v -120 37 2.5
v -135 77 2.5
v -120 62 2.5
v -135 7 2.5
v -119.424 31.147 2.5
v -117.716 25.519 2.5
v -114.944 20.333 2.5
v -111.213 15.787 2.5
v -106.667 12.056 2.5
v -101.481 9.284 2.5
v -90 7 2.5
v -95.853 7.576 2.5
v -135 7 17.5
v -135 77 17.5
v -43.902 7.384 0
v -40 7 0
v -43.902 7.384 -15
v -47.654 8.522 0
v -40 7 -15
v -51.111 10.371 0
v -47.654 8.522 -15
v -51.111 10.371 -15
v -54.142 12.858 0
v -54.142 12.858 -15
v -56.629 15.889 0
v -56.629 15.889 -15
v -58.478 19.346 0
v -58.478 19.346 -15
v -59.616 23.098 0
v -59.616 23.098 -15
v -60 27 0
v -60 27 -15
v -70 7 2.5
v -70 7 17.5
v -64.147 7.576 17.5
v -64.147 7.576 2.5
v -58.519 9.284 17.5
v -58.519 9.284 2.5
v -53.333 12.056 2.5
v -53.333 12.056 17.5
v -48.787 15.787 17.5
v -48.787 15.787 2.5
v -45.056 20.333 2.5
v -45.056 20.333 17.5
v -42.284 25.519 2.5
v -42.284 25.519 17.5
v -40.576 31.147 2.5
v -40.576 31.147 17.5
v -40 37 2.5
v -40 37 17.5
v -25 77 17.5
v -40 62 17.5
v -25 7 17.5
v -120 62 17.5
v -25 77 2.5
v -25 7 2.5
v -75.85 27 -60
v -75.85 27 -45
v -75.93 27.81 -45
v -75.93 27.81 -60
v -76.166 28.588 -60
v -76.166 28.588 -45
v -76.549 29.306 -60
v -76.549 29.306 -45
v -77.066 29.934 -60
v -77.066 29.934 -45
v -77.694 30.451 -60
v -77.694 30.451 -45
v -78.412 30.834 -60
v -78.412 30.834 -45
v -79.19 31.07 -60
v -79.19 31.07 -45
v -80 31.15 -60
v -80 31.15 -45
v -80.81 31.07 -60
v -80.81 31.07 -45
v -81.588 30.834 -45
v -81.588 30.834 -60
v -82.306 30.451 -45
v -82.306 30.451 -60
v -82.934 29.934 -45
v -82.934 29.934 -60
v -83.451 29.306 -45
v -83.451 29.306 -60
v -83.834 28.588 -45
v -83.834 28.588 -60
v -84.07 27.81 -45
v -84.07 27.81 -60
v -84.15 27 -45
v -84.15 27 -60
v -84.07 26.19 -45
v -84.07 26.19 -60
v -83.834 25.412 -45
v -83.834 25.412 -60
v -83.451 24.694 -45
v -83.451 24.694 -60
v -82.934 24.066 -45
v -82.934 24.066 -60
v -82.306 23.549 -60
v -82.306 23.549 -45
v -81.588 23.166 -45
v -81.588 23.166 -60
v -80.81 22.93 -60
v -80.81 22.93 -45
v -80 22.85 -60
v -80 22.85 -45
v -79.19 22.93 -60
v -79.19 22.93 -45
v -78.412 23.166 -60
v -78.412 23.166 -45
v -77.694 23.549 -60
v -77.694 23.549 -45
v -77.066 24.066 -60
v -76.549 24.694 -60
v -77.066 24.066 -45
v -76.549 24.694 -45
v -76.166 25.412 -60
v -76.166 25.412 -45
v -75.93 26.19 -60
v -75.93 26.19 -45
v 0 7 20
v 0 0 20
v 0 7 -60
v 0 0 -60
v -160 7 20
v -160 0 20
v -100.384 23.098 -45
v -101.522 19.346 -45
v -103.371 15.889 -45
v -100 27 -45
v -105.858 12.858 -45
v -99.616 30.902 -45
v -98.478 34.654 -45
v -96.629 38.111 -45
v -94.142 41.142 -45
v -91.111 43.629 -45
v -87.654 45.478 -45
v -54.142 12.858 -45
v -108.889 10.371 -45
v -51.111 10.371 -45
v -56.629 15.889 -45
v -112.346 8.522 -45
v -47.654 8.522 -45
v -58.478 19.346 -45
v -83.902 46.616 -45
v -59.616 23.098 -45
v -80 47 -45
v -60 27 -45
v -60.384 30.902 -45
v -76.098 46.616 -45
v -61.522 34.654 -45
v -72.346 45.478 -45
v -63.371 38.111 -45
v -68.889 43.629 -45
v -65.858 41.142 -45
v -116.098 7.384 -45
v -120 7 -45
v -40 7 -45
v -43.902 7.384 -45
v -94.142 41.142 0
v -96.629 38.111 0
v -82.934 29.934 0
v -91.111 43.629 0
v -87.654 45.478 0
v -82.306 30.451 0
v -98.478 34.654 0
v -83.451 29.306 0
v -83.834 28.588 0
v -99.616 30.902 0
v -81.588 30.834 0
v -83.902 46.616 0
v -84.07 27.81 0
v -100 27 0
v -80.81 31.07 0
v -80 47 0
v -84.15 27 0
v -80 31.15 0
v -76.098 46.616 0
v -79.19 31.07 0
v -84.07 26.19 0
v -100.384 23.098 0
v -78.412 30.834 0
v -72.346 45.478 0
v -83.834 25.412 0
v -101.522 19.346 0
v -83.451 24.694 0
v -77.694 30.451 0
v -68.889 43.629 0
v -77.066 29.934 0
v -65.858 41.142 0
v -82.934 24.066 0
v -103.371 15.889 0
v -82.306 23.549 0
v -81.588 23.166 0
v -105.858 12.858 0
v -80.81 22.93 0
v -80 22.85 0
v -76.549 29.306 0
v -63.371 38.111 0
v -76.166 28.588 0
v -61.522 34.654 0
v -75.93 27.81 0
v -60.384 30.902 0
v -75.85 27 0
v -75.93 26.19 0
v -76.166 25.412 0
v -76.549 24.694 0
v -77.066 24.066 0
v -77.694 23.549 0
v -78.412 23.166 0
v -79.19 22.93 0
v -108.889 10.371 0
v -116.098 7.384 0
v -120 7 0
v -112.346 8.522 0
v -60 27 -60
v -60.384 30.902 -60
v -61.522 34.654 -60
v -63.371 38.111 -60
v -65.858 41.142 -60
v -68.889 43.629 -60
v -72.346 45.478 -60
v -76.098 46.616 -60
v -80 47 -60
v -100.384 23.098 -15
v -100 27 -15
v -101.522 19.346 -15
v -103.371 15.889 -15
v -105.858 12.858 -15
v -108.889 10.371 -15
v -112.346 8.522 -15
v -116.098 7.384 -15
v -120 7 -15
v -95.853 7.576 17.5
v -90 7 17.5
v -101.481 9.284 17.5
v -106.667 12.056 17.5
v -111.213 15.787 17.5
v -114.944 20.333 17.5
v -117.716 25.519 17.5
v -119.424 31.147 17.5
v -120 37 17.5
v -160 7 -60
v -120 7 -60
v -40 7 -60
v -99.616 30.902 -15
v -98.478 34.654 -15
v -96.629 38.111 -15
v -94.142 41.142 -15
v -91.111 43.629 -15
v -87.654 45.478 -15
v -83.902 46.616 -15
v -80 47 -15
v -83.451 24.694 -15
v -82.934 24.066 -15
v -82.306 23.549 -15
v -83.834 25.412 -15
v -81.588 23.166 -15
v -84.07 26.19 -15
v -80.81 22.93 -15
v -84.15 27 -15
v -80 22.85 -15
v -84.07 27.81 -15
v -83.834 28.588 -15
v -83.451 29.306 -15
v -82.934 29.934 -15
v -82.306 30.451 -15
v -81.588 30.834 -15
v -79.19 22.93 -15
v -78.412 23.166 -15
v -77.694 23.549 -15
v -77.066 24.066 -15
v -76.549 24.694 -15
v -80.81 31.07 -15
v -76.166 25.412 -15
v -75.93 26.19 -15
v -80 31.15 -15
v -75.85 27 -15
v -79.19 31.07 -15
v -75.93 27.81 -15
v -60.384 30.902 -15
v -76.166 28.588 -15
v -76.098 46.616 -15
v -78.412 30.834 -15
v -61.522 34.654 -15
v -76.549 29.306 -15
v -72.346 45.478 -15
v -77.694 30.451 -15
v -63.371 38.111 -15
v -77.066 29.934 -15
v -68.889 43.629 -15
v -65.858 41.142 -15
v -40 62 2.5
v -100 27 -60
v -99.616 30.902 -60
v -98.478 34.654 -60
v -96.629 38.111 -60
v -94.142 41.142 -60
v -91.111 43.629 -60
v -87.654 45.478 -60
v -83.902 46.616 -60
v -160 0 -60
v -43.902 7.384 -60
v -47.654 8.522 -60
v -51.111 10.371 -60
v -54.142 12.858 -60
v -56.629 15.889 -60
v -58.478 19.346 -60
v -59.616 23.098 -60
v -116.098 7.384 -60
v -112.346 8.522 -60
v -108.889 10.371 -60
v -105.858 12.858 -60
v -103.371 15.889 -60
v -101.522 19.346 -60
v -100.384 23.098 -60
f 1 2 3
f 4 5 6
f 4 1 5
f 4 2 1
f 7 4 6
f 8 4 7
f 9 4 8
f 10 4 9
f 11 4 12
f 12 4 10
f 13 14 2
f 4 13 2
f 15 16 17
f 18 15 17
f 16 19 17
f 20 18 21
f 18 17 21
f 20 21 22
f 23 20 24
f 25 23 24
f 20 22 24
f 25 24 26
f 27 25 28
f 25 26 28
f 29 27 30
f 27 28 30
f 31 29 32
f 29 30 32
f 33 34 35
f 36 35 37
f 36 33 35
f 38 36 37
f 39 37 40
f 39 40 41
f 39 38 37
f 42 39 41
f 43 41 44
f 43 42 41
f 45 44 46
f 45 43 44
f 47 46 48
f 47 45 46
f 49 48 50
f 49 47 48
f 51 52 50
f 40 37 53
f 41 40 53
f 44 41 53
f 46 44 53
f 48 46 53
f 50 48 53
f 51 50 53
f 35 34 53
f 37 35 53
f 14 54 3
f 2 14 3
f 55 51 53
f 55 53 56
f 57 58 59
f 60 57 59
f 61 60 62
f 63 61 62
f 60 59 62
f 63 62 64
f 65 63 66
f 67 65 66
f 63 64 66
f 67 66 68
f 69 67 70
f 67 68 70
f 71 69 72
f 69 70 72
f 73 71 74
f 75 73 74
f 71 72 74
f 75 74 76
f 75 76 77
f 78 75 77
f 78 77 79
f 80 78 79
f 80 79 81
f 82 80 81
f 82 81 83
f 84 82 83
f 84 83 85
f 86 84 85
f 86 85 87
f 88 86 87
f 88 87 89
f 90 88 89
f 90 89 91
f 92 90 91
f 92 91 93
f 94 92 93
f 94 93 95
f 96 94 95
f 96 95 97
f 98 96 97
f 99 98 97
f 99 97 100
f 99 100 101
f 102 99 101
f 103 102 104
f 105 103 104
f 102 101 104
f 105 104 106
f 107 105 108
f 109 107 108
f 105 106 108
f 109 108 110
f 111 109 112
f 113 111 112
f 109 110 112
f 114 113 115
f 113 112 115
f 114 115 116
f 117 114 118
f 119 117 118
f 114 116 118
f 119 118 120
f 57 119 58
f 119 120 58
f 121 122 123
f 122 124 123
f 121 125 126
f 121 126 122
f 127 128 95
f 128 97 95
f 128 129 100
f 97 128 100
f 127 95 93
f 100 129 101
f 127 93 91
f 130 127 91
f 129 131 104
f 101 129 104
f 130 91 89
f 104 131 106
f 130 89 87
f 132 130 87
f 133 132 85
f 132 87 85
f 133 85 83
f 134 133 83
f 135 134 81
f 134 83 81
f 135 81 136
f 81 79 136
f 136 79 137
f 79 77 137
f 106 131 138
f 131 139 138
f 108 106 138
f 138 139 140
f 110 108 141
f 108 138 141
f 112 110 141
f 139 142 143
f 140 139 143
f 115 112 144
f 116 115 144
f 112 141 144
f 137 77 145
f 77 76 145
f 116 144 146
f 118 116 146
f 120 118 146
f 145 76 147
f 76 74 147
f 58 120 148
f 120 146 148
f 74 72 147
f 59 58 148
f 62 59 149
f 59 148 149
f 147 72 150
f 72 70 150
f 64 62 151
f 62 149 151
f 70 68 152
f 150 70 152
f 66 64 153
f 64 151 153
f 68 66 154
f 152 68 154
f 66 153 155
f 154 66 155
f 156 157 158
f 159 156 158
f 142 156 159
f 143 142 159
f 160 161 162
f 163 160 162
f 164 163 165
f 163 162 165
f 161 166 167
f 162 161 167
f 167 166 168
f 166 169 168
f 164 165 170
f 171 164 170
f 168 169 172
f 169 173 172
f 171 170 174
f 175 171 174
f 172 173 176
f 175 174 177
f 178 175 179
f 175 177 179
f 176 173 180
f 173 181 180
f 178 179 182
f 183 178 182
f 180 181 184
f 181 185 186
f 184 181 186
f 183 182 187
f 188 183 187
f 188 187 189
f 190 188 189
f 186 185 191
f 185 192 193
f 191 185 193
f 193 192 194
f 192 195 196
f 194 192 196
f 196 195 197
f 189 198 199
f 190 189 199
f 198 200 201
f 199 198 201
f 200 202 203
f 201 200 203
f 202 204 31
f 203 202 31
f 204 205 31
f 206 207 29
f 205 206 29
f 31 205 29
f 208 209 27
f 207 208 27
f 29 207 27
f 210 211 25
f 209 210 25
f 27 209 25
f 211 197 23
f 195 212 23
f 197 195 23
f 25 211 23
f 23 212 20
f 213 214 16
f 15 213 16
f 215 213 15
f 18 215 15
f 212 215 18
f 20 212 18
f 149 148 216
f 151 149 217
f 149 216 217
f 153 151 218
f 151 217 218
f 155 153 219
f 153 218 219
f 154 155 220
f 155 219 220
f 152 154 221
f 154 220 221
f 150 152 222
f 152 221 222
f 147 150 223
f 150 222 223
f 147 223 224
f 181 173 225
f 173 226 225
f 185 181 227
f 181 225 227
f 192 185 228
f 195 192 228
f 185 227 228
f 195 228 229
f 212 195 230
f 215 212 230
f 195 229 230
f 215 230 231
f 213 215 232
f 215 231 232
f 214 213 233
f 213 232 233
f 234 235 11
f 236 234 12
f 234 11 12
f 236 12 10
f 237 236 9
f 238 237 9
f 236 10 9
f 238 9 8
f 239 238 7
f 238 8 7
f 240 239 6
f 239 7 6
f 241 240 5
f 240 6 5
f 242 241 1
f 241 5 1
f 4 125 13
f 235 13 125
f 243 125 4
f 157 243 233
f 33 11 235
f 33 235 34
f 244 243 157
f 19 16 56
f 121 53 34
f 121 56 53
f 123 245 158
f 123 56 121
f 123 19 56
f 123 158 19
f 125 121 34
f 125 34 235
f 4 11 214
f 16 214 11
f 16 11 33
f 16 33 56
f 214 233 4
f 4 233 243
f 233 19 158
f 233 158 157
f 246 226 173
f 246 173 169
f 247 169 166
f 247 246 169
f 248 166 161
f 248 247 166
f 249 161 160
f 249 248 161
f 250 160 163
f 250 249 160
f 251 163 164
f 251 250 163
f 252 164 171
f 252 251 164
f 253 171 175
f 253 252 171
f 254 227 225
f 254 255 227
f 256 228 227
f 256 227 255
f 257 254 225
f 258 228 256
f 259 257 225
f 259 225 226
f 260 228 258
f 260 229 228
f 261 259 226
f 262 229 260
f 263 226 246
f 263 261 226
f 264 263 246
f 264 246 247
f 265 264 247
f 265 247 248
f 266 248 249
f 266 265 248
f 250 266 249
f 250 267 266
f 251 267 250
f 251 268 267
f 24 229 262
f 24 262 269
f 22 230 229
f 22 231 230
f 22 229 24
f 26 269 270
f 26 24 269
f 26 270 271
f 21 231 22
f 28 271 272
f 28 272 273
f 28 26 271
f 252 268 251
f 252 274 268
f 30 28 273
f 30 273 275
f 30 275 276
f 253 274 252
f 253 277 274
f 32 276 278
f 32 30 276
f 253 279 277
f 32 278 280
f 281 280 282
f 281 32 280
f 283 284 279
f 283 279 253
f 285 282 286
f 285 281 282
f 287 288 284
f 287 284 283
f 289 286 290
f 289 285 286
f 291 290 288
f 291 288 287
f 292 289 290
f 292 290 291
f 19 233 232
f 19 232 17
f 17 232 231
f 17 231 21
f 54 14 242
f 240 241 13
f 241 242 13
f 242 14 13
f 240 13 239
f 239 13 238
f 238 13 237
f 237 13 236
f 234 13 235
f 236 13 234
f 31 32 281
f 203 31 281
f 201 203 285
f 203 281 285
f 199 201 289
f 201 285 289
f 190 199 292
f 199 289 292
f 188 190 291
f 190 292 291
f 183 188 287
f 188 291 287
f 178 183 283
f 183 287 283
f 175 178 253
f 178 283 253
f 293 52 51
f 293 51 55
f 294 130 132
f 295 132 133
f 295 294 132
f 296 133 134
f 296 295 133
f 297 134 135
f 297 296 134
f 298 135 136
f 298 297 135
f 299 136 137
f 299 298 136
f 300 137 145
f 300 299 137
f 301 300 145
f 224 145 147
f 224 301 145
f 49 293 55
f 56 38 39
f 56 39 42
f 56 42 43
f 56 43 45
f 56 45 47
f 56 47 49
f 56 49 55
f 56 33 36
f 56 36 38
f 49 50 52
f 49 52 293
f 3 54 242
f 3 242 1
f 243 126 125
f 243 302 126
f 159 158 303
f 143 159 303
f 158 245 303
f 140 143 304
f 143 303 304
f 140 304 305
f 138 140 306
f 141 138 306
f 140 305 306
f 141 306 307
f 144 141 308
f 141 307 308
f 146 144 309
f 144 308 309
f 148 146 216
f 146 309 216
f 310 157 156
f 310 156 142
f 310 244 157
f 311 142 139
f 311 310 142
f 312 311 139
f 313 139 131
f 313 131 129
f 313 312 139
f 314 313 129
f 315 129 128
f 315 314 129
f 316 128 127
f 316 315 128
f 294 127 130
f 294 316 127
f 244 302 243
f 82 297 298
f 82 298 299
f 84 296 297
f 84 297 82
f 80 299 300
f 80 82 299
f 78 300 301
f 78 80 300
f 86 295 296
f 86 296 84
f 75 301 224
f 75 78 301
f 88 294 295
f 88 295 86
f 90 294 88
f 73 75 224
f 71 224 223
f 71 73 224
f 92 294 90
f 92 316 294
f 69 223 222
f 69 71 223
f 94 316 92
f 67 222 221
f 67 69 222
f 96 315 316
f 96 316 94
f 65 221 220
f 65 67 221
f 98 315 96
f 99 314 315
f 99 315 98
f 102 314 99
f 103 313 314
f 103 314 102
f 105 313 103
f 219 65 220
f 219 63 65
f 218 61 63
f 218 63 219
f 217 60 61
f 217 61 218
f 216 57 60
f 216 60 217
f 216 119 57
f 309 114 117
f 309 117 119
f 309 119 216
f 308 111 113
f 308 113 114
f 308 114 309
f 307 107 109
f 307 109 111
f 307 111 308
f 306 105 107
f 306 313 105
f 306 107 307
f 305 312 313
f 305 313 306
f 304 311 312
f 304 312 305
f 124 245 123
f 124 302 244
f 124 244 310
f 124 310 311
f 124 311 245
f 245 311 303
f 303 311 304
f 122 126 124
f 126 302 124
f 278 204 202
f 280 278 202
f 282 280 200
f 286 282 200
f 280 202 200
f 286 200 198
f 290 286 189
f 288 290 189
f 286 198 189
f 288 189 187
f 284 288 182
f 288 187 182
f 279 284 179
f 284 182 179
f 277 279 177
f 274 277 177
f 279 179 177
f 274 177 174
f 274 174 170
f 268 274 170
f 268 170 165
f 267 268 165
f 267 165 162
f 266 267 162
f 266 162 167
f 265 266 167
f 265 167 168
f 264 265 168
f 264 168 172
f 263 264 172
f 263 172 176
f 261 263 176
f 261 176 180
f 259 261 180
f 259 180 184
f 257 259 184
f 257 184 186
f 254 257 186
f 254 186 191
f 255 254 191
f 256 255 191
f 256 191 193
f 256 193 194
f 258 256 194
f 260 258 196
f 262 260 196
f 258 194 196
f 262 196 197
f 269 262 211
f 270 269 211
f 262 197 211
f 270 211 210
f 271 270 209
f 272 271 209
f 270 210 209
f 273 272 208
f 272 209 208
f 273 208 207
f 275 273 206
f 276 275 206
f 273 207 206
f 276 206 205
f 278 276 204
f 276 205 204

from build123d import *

# Parameters (mm, degrees)
SKETCH1_W           = 160
SKETCH1_H           = 60
BOSS_EXTRUDE1_DEPTH = 7
SKETCH2_W           = 40
SKETCH2_H           = 60
BOSS_EXTRUDE2_DEPTH = 40
FILLET1_R           = 20
SKETCH3_W           = 30
SKETCH3_H           = 40
CUT_EXTRUDE1_DEPTH  = 40
SKETCH4_R           = 4.15
CUT_EXTRUDE2_DEPTH  = 178.225844616
FILLET2_R           = 20
SKETCH5_W           = 160
SKETCH5_H           = 7
BOSS_EXTRUDE3_DEPTH = 20
SKETCH6_W           = 15
SKETCH6_H           = 15
BOSS_EXTRUDE4_DEPTH = 70
FILLET3_R           = 30
CHAMFER1_SIZE       = 15


with BuildPart() as part:
    # Sketch1 → Boss-Extrude1 (new body)
    with BuildSketch(Plane(origin=(0, 0, 0), x_dir=(1, 0, 0), z_dir=(0, 1, 0))):
        with Locations((-80, 30)):
            Rectangle(SKETCH1_W, SKETCH1_H)
    extrude(amount=BOSS_EXTRUDE1_DEPTH)

    # Sketch2 → Boss-Extrude2 (add)
    with BuildSketch(Plane(origin=(0, 7, 0), x_dir=(1, 0, 0), z_dir=(0, 1, 0))):
        with Locations((-80, 30)):
            Rectangle(SKETCH2_W, SKETCH2_H)
    extrude(amount=BOSS_EXTRUDE2_DEPTH)

    # Fillet1
    fillet1_edges = [part.edges().sort_by_distance(p)[0] for p in [
        (-60, 47, -30),
        (-100, 47, -30),
    ]]
    fillet(fillet1_edges, radius=FILLET1_R - 0.0001)  # a hair under: the kernel refuses the full size

    # Sketch3 → Cut-Extrude1 (cut)
    with BuildSketch(Plane(origin=(-60, 0, 0), x_dir=(0, 0, -1), z_dir=(1, 0, 0))):
        with Locations((30, 27)):
            Rectangle(SKETCH3_W, SKETCH3_H)
    extrude(amount=-CUT_EXTRUDE1_DEPTH, mode=Mode.SUBTRACT)

    # Sketch4 → Cut-Extrude2 (cut, through all)
    with BuildSketch(Plane.XY):
        with Locations((-80, 27)):
            Circle(SKETCH4_R)
    extrude(amount=-CUT_EXTRUDE2_DEPTH, mode=Mode.SUBTRACT)

    # Fillet2
    fillet2_edges = [part.edges().sort_by_distance(p)[0] for p in [
        (-100, 7, -7.5),
        (-100, 7, -52.5),
        (-60, 7, -7.5),
        (-60, 7, -52.5),
    ]]
    fillet(fillet2_edges, radius=FILLET2_R)

    # Sketch5 → Boss-Extrude3 (add)
    with BuildSketch(Plane.XY):
        with Locations((-80, 3.5)):
            Rectangle(SKETCH5_W, SKETCH5_H)
    extrude(amount=BOSS_EXTRUDE3_DEPTH)

    # Sketch6 → Boss-Extrude4 (add)
    with BuildSketch(Plane(origin=(0, 7, 0), x_dir=(1, 0, 0), z_dir=(0, 1, 0))):
        with Locations((-127.5, -10)):
            Rectangle(SKETCH6_W, SKETCH6_H)
        with Locations((-32.5, -10)):
            Rectangle(SKETCH6_W, SKETCH6_H)
    extrude(amount=BOSS_EXTRUDE4_DEPTH)

    # Fillet3
    fillet3_edges = [part.edges().sort_by_distance(p)[0] for p in [
        (-120, 7, 10),
        (-40, 7, 10),
    ]]
    fillet(fillet3_edges, radius=FILLET3_R)

    # Chamfer1
    chamfer1_edges = [part.edges().sort_by_distance(p)[0] for p in [
        (-40, 77, 10),
        (-120, 77, 10),
    ]]
    chamfer(chamfer1_edges, length=CHAMFER1_SIZE - 0.0001)  # a hair under: the kernel refuses the full size


solid = part.part
